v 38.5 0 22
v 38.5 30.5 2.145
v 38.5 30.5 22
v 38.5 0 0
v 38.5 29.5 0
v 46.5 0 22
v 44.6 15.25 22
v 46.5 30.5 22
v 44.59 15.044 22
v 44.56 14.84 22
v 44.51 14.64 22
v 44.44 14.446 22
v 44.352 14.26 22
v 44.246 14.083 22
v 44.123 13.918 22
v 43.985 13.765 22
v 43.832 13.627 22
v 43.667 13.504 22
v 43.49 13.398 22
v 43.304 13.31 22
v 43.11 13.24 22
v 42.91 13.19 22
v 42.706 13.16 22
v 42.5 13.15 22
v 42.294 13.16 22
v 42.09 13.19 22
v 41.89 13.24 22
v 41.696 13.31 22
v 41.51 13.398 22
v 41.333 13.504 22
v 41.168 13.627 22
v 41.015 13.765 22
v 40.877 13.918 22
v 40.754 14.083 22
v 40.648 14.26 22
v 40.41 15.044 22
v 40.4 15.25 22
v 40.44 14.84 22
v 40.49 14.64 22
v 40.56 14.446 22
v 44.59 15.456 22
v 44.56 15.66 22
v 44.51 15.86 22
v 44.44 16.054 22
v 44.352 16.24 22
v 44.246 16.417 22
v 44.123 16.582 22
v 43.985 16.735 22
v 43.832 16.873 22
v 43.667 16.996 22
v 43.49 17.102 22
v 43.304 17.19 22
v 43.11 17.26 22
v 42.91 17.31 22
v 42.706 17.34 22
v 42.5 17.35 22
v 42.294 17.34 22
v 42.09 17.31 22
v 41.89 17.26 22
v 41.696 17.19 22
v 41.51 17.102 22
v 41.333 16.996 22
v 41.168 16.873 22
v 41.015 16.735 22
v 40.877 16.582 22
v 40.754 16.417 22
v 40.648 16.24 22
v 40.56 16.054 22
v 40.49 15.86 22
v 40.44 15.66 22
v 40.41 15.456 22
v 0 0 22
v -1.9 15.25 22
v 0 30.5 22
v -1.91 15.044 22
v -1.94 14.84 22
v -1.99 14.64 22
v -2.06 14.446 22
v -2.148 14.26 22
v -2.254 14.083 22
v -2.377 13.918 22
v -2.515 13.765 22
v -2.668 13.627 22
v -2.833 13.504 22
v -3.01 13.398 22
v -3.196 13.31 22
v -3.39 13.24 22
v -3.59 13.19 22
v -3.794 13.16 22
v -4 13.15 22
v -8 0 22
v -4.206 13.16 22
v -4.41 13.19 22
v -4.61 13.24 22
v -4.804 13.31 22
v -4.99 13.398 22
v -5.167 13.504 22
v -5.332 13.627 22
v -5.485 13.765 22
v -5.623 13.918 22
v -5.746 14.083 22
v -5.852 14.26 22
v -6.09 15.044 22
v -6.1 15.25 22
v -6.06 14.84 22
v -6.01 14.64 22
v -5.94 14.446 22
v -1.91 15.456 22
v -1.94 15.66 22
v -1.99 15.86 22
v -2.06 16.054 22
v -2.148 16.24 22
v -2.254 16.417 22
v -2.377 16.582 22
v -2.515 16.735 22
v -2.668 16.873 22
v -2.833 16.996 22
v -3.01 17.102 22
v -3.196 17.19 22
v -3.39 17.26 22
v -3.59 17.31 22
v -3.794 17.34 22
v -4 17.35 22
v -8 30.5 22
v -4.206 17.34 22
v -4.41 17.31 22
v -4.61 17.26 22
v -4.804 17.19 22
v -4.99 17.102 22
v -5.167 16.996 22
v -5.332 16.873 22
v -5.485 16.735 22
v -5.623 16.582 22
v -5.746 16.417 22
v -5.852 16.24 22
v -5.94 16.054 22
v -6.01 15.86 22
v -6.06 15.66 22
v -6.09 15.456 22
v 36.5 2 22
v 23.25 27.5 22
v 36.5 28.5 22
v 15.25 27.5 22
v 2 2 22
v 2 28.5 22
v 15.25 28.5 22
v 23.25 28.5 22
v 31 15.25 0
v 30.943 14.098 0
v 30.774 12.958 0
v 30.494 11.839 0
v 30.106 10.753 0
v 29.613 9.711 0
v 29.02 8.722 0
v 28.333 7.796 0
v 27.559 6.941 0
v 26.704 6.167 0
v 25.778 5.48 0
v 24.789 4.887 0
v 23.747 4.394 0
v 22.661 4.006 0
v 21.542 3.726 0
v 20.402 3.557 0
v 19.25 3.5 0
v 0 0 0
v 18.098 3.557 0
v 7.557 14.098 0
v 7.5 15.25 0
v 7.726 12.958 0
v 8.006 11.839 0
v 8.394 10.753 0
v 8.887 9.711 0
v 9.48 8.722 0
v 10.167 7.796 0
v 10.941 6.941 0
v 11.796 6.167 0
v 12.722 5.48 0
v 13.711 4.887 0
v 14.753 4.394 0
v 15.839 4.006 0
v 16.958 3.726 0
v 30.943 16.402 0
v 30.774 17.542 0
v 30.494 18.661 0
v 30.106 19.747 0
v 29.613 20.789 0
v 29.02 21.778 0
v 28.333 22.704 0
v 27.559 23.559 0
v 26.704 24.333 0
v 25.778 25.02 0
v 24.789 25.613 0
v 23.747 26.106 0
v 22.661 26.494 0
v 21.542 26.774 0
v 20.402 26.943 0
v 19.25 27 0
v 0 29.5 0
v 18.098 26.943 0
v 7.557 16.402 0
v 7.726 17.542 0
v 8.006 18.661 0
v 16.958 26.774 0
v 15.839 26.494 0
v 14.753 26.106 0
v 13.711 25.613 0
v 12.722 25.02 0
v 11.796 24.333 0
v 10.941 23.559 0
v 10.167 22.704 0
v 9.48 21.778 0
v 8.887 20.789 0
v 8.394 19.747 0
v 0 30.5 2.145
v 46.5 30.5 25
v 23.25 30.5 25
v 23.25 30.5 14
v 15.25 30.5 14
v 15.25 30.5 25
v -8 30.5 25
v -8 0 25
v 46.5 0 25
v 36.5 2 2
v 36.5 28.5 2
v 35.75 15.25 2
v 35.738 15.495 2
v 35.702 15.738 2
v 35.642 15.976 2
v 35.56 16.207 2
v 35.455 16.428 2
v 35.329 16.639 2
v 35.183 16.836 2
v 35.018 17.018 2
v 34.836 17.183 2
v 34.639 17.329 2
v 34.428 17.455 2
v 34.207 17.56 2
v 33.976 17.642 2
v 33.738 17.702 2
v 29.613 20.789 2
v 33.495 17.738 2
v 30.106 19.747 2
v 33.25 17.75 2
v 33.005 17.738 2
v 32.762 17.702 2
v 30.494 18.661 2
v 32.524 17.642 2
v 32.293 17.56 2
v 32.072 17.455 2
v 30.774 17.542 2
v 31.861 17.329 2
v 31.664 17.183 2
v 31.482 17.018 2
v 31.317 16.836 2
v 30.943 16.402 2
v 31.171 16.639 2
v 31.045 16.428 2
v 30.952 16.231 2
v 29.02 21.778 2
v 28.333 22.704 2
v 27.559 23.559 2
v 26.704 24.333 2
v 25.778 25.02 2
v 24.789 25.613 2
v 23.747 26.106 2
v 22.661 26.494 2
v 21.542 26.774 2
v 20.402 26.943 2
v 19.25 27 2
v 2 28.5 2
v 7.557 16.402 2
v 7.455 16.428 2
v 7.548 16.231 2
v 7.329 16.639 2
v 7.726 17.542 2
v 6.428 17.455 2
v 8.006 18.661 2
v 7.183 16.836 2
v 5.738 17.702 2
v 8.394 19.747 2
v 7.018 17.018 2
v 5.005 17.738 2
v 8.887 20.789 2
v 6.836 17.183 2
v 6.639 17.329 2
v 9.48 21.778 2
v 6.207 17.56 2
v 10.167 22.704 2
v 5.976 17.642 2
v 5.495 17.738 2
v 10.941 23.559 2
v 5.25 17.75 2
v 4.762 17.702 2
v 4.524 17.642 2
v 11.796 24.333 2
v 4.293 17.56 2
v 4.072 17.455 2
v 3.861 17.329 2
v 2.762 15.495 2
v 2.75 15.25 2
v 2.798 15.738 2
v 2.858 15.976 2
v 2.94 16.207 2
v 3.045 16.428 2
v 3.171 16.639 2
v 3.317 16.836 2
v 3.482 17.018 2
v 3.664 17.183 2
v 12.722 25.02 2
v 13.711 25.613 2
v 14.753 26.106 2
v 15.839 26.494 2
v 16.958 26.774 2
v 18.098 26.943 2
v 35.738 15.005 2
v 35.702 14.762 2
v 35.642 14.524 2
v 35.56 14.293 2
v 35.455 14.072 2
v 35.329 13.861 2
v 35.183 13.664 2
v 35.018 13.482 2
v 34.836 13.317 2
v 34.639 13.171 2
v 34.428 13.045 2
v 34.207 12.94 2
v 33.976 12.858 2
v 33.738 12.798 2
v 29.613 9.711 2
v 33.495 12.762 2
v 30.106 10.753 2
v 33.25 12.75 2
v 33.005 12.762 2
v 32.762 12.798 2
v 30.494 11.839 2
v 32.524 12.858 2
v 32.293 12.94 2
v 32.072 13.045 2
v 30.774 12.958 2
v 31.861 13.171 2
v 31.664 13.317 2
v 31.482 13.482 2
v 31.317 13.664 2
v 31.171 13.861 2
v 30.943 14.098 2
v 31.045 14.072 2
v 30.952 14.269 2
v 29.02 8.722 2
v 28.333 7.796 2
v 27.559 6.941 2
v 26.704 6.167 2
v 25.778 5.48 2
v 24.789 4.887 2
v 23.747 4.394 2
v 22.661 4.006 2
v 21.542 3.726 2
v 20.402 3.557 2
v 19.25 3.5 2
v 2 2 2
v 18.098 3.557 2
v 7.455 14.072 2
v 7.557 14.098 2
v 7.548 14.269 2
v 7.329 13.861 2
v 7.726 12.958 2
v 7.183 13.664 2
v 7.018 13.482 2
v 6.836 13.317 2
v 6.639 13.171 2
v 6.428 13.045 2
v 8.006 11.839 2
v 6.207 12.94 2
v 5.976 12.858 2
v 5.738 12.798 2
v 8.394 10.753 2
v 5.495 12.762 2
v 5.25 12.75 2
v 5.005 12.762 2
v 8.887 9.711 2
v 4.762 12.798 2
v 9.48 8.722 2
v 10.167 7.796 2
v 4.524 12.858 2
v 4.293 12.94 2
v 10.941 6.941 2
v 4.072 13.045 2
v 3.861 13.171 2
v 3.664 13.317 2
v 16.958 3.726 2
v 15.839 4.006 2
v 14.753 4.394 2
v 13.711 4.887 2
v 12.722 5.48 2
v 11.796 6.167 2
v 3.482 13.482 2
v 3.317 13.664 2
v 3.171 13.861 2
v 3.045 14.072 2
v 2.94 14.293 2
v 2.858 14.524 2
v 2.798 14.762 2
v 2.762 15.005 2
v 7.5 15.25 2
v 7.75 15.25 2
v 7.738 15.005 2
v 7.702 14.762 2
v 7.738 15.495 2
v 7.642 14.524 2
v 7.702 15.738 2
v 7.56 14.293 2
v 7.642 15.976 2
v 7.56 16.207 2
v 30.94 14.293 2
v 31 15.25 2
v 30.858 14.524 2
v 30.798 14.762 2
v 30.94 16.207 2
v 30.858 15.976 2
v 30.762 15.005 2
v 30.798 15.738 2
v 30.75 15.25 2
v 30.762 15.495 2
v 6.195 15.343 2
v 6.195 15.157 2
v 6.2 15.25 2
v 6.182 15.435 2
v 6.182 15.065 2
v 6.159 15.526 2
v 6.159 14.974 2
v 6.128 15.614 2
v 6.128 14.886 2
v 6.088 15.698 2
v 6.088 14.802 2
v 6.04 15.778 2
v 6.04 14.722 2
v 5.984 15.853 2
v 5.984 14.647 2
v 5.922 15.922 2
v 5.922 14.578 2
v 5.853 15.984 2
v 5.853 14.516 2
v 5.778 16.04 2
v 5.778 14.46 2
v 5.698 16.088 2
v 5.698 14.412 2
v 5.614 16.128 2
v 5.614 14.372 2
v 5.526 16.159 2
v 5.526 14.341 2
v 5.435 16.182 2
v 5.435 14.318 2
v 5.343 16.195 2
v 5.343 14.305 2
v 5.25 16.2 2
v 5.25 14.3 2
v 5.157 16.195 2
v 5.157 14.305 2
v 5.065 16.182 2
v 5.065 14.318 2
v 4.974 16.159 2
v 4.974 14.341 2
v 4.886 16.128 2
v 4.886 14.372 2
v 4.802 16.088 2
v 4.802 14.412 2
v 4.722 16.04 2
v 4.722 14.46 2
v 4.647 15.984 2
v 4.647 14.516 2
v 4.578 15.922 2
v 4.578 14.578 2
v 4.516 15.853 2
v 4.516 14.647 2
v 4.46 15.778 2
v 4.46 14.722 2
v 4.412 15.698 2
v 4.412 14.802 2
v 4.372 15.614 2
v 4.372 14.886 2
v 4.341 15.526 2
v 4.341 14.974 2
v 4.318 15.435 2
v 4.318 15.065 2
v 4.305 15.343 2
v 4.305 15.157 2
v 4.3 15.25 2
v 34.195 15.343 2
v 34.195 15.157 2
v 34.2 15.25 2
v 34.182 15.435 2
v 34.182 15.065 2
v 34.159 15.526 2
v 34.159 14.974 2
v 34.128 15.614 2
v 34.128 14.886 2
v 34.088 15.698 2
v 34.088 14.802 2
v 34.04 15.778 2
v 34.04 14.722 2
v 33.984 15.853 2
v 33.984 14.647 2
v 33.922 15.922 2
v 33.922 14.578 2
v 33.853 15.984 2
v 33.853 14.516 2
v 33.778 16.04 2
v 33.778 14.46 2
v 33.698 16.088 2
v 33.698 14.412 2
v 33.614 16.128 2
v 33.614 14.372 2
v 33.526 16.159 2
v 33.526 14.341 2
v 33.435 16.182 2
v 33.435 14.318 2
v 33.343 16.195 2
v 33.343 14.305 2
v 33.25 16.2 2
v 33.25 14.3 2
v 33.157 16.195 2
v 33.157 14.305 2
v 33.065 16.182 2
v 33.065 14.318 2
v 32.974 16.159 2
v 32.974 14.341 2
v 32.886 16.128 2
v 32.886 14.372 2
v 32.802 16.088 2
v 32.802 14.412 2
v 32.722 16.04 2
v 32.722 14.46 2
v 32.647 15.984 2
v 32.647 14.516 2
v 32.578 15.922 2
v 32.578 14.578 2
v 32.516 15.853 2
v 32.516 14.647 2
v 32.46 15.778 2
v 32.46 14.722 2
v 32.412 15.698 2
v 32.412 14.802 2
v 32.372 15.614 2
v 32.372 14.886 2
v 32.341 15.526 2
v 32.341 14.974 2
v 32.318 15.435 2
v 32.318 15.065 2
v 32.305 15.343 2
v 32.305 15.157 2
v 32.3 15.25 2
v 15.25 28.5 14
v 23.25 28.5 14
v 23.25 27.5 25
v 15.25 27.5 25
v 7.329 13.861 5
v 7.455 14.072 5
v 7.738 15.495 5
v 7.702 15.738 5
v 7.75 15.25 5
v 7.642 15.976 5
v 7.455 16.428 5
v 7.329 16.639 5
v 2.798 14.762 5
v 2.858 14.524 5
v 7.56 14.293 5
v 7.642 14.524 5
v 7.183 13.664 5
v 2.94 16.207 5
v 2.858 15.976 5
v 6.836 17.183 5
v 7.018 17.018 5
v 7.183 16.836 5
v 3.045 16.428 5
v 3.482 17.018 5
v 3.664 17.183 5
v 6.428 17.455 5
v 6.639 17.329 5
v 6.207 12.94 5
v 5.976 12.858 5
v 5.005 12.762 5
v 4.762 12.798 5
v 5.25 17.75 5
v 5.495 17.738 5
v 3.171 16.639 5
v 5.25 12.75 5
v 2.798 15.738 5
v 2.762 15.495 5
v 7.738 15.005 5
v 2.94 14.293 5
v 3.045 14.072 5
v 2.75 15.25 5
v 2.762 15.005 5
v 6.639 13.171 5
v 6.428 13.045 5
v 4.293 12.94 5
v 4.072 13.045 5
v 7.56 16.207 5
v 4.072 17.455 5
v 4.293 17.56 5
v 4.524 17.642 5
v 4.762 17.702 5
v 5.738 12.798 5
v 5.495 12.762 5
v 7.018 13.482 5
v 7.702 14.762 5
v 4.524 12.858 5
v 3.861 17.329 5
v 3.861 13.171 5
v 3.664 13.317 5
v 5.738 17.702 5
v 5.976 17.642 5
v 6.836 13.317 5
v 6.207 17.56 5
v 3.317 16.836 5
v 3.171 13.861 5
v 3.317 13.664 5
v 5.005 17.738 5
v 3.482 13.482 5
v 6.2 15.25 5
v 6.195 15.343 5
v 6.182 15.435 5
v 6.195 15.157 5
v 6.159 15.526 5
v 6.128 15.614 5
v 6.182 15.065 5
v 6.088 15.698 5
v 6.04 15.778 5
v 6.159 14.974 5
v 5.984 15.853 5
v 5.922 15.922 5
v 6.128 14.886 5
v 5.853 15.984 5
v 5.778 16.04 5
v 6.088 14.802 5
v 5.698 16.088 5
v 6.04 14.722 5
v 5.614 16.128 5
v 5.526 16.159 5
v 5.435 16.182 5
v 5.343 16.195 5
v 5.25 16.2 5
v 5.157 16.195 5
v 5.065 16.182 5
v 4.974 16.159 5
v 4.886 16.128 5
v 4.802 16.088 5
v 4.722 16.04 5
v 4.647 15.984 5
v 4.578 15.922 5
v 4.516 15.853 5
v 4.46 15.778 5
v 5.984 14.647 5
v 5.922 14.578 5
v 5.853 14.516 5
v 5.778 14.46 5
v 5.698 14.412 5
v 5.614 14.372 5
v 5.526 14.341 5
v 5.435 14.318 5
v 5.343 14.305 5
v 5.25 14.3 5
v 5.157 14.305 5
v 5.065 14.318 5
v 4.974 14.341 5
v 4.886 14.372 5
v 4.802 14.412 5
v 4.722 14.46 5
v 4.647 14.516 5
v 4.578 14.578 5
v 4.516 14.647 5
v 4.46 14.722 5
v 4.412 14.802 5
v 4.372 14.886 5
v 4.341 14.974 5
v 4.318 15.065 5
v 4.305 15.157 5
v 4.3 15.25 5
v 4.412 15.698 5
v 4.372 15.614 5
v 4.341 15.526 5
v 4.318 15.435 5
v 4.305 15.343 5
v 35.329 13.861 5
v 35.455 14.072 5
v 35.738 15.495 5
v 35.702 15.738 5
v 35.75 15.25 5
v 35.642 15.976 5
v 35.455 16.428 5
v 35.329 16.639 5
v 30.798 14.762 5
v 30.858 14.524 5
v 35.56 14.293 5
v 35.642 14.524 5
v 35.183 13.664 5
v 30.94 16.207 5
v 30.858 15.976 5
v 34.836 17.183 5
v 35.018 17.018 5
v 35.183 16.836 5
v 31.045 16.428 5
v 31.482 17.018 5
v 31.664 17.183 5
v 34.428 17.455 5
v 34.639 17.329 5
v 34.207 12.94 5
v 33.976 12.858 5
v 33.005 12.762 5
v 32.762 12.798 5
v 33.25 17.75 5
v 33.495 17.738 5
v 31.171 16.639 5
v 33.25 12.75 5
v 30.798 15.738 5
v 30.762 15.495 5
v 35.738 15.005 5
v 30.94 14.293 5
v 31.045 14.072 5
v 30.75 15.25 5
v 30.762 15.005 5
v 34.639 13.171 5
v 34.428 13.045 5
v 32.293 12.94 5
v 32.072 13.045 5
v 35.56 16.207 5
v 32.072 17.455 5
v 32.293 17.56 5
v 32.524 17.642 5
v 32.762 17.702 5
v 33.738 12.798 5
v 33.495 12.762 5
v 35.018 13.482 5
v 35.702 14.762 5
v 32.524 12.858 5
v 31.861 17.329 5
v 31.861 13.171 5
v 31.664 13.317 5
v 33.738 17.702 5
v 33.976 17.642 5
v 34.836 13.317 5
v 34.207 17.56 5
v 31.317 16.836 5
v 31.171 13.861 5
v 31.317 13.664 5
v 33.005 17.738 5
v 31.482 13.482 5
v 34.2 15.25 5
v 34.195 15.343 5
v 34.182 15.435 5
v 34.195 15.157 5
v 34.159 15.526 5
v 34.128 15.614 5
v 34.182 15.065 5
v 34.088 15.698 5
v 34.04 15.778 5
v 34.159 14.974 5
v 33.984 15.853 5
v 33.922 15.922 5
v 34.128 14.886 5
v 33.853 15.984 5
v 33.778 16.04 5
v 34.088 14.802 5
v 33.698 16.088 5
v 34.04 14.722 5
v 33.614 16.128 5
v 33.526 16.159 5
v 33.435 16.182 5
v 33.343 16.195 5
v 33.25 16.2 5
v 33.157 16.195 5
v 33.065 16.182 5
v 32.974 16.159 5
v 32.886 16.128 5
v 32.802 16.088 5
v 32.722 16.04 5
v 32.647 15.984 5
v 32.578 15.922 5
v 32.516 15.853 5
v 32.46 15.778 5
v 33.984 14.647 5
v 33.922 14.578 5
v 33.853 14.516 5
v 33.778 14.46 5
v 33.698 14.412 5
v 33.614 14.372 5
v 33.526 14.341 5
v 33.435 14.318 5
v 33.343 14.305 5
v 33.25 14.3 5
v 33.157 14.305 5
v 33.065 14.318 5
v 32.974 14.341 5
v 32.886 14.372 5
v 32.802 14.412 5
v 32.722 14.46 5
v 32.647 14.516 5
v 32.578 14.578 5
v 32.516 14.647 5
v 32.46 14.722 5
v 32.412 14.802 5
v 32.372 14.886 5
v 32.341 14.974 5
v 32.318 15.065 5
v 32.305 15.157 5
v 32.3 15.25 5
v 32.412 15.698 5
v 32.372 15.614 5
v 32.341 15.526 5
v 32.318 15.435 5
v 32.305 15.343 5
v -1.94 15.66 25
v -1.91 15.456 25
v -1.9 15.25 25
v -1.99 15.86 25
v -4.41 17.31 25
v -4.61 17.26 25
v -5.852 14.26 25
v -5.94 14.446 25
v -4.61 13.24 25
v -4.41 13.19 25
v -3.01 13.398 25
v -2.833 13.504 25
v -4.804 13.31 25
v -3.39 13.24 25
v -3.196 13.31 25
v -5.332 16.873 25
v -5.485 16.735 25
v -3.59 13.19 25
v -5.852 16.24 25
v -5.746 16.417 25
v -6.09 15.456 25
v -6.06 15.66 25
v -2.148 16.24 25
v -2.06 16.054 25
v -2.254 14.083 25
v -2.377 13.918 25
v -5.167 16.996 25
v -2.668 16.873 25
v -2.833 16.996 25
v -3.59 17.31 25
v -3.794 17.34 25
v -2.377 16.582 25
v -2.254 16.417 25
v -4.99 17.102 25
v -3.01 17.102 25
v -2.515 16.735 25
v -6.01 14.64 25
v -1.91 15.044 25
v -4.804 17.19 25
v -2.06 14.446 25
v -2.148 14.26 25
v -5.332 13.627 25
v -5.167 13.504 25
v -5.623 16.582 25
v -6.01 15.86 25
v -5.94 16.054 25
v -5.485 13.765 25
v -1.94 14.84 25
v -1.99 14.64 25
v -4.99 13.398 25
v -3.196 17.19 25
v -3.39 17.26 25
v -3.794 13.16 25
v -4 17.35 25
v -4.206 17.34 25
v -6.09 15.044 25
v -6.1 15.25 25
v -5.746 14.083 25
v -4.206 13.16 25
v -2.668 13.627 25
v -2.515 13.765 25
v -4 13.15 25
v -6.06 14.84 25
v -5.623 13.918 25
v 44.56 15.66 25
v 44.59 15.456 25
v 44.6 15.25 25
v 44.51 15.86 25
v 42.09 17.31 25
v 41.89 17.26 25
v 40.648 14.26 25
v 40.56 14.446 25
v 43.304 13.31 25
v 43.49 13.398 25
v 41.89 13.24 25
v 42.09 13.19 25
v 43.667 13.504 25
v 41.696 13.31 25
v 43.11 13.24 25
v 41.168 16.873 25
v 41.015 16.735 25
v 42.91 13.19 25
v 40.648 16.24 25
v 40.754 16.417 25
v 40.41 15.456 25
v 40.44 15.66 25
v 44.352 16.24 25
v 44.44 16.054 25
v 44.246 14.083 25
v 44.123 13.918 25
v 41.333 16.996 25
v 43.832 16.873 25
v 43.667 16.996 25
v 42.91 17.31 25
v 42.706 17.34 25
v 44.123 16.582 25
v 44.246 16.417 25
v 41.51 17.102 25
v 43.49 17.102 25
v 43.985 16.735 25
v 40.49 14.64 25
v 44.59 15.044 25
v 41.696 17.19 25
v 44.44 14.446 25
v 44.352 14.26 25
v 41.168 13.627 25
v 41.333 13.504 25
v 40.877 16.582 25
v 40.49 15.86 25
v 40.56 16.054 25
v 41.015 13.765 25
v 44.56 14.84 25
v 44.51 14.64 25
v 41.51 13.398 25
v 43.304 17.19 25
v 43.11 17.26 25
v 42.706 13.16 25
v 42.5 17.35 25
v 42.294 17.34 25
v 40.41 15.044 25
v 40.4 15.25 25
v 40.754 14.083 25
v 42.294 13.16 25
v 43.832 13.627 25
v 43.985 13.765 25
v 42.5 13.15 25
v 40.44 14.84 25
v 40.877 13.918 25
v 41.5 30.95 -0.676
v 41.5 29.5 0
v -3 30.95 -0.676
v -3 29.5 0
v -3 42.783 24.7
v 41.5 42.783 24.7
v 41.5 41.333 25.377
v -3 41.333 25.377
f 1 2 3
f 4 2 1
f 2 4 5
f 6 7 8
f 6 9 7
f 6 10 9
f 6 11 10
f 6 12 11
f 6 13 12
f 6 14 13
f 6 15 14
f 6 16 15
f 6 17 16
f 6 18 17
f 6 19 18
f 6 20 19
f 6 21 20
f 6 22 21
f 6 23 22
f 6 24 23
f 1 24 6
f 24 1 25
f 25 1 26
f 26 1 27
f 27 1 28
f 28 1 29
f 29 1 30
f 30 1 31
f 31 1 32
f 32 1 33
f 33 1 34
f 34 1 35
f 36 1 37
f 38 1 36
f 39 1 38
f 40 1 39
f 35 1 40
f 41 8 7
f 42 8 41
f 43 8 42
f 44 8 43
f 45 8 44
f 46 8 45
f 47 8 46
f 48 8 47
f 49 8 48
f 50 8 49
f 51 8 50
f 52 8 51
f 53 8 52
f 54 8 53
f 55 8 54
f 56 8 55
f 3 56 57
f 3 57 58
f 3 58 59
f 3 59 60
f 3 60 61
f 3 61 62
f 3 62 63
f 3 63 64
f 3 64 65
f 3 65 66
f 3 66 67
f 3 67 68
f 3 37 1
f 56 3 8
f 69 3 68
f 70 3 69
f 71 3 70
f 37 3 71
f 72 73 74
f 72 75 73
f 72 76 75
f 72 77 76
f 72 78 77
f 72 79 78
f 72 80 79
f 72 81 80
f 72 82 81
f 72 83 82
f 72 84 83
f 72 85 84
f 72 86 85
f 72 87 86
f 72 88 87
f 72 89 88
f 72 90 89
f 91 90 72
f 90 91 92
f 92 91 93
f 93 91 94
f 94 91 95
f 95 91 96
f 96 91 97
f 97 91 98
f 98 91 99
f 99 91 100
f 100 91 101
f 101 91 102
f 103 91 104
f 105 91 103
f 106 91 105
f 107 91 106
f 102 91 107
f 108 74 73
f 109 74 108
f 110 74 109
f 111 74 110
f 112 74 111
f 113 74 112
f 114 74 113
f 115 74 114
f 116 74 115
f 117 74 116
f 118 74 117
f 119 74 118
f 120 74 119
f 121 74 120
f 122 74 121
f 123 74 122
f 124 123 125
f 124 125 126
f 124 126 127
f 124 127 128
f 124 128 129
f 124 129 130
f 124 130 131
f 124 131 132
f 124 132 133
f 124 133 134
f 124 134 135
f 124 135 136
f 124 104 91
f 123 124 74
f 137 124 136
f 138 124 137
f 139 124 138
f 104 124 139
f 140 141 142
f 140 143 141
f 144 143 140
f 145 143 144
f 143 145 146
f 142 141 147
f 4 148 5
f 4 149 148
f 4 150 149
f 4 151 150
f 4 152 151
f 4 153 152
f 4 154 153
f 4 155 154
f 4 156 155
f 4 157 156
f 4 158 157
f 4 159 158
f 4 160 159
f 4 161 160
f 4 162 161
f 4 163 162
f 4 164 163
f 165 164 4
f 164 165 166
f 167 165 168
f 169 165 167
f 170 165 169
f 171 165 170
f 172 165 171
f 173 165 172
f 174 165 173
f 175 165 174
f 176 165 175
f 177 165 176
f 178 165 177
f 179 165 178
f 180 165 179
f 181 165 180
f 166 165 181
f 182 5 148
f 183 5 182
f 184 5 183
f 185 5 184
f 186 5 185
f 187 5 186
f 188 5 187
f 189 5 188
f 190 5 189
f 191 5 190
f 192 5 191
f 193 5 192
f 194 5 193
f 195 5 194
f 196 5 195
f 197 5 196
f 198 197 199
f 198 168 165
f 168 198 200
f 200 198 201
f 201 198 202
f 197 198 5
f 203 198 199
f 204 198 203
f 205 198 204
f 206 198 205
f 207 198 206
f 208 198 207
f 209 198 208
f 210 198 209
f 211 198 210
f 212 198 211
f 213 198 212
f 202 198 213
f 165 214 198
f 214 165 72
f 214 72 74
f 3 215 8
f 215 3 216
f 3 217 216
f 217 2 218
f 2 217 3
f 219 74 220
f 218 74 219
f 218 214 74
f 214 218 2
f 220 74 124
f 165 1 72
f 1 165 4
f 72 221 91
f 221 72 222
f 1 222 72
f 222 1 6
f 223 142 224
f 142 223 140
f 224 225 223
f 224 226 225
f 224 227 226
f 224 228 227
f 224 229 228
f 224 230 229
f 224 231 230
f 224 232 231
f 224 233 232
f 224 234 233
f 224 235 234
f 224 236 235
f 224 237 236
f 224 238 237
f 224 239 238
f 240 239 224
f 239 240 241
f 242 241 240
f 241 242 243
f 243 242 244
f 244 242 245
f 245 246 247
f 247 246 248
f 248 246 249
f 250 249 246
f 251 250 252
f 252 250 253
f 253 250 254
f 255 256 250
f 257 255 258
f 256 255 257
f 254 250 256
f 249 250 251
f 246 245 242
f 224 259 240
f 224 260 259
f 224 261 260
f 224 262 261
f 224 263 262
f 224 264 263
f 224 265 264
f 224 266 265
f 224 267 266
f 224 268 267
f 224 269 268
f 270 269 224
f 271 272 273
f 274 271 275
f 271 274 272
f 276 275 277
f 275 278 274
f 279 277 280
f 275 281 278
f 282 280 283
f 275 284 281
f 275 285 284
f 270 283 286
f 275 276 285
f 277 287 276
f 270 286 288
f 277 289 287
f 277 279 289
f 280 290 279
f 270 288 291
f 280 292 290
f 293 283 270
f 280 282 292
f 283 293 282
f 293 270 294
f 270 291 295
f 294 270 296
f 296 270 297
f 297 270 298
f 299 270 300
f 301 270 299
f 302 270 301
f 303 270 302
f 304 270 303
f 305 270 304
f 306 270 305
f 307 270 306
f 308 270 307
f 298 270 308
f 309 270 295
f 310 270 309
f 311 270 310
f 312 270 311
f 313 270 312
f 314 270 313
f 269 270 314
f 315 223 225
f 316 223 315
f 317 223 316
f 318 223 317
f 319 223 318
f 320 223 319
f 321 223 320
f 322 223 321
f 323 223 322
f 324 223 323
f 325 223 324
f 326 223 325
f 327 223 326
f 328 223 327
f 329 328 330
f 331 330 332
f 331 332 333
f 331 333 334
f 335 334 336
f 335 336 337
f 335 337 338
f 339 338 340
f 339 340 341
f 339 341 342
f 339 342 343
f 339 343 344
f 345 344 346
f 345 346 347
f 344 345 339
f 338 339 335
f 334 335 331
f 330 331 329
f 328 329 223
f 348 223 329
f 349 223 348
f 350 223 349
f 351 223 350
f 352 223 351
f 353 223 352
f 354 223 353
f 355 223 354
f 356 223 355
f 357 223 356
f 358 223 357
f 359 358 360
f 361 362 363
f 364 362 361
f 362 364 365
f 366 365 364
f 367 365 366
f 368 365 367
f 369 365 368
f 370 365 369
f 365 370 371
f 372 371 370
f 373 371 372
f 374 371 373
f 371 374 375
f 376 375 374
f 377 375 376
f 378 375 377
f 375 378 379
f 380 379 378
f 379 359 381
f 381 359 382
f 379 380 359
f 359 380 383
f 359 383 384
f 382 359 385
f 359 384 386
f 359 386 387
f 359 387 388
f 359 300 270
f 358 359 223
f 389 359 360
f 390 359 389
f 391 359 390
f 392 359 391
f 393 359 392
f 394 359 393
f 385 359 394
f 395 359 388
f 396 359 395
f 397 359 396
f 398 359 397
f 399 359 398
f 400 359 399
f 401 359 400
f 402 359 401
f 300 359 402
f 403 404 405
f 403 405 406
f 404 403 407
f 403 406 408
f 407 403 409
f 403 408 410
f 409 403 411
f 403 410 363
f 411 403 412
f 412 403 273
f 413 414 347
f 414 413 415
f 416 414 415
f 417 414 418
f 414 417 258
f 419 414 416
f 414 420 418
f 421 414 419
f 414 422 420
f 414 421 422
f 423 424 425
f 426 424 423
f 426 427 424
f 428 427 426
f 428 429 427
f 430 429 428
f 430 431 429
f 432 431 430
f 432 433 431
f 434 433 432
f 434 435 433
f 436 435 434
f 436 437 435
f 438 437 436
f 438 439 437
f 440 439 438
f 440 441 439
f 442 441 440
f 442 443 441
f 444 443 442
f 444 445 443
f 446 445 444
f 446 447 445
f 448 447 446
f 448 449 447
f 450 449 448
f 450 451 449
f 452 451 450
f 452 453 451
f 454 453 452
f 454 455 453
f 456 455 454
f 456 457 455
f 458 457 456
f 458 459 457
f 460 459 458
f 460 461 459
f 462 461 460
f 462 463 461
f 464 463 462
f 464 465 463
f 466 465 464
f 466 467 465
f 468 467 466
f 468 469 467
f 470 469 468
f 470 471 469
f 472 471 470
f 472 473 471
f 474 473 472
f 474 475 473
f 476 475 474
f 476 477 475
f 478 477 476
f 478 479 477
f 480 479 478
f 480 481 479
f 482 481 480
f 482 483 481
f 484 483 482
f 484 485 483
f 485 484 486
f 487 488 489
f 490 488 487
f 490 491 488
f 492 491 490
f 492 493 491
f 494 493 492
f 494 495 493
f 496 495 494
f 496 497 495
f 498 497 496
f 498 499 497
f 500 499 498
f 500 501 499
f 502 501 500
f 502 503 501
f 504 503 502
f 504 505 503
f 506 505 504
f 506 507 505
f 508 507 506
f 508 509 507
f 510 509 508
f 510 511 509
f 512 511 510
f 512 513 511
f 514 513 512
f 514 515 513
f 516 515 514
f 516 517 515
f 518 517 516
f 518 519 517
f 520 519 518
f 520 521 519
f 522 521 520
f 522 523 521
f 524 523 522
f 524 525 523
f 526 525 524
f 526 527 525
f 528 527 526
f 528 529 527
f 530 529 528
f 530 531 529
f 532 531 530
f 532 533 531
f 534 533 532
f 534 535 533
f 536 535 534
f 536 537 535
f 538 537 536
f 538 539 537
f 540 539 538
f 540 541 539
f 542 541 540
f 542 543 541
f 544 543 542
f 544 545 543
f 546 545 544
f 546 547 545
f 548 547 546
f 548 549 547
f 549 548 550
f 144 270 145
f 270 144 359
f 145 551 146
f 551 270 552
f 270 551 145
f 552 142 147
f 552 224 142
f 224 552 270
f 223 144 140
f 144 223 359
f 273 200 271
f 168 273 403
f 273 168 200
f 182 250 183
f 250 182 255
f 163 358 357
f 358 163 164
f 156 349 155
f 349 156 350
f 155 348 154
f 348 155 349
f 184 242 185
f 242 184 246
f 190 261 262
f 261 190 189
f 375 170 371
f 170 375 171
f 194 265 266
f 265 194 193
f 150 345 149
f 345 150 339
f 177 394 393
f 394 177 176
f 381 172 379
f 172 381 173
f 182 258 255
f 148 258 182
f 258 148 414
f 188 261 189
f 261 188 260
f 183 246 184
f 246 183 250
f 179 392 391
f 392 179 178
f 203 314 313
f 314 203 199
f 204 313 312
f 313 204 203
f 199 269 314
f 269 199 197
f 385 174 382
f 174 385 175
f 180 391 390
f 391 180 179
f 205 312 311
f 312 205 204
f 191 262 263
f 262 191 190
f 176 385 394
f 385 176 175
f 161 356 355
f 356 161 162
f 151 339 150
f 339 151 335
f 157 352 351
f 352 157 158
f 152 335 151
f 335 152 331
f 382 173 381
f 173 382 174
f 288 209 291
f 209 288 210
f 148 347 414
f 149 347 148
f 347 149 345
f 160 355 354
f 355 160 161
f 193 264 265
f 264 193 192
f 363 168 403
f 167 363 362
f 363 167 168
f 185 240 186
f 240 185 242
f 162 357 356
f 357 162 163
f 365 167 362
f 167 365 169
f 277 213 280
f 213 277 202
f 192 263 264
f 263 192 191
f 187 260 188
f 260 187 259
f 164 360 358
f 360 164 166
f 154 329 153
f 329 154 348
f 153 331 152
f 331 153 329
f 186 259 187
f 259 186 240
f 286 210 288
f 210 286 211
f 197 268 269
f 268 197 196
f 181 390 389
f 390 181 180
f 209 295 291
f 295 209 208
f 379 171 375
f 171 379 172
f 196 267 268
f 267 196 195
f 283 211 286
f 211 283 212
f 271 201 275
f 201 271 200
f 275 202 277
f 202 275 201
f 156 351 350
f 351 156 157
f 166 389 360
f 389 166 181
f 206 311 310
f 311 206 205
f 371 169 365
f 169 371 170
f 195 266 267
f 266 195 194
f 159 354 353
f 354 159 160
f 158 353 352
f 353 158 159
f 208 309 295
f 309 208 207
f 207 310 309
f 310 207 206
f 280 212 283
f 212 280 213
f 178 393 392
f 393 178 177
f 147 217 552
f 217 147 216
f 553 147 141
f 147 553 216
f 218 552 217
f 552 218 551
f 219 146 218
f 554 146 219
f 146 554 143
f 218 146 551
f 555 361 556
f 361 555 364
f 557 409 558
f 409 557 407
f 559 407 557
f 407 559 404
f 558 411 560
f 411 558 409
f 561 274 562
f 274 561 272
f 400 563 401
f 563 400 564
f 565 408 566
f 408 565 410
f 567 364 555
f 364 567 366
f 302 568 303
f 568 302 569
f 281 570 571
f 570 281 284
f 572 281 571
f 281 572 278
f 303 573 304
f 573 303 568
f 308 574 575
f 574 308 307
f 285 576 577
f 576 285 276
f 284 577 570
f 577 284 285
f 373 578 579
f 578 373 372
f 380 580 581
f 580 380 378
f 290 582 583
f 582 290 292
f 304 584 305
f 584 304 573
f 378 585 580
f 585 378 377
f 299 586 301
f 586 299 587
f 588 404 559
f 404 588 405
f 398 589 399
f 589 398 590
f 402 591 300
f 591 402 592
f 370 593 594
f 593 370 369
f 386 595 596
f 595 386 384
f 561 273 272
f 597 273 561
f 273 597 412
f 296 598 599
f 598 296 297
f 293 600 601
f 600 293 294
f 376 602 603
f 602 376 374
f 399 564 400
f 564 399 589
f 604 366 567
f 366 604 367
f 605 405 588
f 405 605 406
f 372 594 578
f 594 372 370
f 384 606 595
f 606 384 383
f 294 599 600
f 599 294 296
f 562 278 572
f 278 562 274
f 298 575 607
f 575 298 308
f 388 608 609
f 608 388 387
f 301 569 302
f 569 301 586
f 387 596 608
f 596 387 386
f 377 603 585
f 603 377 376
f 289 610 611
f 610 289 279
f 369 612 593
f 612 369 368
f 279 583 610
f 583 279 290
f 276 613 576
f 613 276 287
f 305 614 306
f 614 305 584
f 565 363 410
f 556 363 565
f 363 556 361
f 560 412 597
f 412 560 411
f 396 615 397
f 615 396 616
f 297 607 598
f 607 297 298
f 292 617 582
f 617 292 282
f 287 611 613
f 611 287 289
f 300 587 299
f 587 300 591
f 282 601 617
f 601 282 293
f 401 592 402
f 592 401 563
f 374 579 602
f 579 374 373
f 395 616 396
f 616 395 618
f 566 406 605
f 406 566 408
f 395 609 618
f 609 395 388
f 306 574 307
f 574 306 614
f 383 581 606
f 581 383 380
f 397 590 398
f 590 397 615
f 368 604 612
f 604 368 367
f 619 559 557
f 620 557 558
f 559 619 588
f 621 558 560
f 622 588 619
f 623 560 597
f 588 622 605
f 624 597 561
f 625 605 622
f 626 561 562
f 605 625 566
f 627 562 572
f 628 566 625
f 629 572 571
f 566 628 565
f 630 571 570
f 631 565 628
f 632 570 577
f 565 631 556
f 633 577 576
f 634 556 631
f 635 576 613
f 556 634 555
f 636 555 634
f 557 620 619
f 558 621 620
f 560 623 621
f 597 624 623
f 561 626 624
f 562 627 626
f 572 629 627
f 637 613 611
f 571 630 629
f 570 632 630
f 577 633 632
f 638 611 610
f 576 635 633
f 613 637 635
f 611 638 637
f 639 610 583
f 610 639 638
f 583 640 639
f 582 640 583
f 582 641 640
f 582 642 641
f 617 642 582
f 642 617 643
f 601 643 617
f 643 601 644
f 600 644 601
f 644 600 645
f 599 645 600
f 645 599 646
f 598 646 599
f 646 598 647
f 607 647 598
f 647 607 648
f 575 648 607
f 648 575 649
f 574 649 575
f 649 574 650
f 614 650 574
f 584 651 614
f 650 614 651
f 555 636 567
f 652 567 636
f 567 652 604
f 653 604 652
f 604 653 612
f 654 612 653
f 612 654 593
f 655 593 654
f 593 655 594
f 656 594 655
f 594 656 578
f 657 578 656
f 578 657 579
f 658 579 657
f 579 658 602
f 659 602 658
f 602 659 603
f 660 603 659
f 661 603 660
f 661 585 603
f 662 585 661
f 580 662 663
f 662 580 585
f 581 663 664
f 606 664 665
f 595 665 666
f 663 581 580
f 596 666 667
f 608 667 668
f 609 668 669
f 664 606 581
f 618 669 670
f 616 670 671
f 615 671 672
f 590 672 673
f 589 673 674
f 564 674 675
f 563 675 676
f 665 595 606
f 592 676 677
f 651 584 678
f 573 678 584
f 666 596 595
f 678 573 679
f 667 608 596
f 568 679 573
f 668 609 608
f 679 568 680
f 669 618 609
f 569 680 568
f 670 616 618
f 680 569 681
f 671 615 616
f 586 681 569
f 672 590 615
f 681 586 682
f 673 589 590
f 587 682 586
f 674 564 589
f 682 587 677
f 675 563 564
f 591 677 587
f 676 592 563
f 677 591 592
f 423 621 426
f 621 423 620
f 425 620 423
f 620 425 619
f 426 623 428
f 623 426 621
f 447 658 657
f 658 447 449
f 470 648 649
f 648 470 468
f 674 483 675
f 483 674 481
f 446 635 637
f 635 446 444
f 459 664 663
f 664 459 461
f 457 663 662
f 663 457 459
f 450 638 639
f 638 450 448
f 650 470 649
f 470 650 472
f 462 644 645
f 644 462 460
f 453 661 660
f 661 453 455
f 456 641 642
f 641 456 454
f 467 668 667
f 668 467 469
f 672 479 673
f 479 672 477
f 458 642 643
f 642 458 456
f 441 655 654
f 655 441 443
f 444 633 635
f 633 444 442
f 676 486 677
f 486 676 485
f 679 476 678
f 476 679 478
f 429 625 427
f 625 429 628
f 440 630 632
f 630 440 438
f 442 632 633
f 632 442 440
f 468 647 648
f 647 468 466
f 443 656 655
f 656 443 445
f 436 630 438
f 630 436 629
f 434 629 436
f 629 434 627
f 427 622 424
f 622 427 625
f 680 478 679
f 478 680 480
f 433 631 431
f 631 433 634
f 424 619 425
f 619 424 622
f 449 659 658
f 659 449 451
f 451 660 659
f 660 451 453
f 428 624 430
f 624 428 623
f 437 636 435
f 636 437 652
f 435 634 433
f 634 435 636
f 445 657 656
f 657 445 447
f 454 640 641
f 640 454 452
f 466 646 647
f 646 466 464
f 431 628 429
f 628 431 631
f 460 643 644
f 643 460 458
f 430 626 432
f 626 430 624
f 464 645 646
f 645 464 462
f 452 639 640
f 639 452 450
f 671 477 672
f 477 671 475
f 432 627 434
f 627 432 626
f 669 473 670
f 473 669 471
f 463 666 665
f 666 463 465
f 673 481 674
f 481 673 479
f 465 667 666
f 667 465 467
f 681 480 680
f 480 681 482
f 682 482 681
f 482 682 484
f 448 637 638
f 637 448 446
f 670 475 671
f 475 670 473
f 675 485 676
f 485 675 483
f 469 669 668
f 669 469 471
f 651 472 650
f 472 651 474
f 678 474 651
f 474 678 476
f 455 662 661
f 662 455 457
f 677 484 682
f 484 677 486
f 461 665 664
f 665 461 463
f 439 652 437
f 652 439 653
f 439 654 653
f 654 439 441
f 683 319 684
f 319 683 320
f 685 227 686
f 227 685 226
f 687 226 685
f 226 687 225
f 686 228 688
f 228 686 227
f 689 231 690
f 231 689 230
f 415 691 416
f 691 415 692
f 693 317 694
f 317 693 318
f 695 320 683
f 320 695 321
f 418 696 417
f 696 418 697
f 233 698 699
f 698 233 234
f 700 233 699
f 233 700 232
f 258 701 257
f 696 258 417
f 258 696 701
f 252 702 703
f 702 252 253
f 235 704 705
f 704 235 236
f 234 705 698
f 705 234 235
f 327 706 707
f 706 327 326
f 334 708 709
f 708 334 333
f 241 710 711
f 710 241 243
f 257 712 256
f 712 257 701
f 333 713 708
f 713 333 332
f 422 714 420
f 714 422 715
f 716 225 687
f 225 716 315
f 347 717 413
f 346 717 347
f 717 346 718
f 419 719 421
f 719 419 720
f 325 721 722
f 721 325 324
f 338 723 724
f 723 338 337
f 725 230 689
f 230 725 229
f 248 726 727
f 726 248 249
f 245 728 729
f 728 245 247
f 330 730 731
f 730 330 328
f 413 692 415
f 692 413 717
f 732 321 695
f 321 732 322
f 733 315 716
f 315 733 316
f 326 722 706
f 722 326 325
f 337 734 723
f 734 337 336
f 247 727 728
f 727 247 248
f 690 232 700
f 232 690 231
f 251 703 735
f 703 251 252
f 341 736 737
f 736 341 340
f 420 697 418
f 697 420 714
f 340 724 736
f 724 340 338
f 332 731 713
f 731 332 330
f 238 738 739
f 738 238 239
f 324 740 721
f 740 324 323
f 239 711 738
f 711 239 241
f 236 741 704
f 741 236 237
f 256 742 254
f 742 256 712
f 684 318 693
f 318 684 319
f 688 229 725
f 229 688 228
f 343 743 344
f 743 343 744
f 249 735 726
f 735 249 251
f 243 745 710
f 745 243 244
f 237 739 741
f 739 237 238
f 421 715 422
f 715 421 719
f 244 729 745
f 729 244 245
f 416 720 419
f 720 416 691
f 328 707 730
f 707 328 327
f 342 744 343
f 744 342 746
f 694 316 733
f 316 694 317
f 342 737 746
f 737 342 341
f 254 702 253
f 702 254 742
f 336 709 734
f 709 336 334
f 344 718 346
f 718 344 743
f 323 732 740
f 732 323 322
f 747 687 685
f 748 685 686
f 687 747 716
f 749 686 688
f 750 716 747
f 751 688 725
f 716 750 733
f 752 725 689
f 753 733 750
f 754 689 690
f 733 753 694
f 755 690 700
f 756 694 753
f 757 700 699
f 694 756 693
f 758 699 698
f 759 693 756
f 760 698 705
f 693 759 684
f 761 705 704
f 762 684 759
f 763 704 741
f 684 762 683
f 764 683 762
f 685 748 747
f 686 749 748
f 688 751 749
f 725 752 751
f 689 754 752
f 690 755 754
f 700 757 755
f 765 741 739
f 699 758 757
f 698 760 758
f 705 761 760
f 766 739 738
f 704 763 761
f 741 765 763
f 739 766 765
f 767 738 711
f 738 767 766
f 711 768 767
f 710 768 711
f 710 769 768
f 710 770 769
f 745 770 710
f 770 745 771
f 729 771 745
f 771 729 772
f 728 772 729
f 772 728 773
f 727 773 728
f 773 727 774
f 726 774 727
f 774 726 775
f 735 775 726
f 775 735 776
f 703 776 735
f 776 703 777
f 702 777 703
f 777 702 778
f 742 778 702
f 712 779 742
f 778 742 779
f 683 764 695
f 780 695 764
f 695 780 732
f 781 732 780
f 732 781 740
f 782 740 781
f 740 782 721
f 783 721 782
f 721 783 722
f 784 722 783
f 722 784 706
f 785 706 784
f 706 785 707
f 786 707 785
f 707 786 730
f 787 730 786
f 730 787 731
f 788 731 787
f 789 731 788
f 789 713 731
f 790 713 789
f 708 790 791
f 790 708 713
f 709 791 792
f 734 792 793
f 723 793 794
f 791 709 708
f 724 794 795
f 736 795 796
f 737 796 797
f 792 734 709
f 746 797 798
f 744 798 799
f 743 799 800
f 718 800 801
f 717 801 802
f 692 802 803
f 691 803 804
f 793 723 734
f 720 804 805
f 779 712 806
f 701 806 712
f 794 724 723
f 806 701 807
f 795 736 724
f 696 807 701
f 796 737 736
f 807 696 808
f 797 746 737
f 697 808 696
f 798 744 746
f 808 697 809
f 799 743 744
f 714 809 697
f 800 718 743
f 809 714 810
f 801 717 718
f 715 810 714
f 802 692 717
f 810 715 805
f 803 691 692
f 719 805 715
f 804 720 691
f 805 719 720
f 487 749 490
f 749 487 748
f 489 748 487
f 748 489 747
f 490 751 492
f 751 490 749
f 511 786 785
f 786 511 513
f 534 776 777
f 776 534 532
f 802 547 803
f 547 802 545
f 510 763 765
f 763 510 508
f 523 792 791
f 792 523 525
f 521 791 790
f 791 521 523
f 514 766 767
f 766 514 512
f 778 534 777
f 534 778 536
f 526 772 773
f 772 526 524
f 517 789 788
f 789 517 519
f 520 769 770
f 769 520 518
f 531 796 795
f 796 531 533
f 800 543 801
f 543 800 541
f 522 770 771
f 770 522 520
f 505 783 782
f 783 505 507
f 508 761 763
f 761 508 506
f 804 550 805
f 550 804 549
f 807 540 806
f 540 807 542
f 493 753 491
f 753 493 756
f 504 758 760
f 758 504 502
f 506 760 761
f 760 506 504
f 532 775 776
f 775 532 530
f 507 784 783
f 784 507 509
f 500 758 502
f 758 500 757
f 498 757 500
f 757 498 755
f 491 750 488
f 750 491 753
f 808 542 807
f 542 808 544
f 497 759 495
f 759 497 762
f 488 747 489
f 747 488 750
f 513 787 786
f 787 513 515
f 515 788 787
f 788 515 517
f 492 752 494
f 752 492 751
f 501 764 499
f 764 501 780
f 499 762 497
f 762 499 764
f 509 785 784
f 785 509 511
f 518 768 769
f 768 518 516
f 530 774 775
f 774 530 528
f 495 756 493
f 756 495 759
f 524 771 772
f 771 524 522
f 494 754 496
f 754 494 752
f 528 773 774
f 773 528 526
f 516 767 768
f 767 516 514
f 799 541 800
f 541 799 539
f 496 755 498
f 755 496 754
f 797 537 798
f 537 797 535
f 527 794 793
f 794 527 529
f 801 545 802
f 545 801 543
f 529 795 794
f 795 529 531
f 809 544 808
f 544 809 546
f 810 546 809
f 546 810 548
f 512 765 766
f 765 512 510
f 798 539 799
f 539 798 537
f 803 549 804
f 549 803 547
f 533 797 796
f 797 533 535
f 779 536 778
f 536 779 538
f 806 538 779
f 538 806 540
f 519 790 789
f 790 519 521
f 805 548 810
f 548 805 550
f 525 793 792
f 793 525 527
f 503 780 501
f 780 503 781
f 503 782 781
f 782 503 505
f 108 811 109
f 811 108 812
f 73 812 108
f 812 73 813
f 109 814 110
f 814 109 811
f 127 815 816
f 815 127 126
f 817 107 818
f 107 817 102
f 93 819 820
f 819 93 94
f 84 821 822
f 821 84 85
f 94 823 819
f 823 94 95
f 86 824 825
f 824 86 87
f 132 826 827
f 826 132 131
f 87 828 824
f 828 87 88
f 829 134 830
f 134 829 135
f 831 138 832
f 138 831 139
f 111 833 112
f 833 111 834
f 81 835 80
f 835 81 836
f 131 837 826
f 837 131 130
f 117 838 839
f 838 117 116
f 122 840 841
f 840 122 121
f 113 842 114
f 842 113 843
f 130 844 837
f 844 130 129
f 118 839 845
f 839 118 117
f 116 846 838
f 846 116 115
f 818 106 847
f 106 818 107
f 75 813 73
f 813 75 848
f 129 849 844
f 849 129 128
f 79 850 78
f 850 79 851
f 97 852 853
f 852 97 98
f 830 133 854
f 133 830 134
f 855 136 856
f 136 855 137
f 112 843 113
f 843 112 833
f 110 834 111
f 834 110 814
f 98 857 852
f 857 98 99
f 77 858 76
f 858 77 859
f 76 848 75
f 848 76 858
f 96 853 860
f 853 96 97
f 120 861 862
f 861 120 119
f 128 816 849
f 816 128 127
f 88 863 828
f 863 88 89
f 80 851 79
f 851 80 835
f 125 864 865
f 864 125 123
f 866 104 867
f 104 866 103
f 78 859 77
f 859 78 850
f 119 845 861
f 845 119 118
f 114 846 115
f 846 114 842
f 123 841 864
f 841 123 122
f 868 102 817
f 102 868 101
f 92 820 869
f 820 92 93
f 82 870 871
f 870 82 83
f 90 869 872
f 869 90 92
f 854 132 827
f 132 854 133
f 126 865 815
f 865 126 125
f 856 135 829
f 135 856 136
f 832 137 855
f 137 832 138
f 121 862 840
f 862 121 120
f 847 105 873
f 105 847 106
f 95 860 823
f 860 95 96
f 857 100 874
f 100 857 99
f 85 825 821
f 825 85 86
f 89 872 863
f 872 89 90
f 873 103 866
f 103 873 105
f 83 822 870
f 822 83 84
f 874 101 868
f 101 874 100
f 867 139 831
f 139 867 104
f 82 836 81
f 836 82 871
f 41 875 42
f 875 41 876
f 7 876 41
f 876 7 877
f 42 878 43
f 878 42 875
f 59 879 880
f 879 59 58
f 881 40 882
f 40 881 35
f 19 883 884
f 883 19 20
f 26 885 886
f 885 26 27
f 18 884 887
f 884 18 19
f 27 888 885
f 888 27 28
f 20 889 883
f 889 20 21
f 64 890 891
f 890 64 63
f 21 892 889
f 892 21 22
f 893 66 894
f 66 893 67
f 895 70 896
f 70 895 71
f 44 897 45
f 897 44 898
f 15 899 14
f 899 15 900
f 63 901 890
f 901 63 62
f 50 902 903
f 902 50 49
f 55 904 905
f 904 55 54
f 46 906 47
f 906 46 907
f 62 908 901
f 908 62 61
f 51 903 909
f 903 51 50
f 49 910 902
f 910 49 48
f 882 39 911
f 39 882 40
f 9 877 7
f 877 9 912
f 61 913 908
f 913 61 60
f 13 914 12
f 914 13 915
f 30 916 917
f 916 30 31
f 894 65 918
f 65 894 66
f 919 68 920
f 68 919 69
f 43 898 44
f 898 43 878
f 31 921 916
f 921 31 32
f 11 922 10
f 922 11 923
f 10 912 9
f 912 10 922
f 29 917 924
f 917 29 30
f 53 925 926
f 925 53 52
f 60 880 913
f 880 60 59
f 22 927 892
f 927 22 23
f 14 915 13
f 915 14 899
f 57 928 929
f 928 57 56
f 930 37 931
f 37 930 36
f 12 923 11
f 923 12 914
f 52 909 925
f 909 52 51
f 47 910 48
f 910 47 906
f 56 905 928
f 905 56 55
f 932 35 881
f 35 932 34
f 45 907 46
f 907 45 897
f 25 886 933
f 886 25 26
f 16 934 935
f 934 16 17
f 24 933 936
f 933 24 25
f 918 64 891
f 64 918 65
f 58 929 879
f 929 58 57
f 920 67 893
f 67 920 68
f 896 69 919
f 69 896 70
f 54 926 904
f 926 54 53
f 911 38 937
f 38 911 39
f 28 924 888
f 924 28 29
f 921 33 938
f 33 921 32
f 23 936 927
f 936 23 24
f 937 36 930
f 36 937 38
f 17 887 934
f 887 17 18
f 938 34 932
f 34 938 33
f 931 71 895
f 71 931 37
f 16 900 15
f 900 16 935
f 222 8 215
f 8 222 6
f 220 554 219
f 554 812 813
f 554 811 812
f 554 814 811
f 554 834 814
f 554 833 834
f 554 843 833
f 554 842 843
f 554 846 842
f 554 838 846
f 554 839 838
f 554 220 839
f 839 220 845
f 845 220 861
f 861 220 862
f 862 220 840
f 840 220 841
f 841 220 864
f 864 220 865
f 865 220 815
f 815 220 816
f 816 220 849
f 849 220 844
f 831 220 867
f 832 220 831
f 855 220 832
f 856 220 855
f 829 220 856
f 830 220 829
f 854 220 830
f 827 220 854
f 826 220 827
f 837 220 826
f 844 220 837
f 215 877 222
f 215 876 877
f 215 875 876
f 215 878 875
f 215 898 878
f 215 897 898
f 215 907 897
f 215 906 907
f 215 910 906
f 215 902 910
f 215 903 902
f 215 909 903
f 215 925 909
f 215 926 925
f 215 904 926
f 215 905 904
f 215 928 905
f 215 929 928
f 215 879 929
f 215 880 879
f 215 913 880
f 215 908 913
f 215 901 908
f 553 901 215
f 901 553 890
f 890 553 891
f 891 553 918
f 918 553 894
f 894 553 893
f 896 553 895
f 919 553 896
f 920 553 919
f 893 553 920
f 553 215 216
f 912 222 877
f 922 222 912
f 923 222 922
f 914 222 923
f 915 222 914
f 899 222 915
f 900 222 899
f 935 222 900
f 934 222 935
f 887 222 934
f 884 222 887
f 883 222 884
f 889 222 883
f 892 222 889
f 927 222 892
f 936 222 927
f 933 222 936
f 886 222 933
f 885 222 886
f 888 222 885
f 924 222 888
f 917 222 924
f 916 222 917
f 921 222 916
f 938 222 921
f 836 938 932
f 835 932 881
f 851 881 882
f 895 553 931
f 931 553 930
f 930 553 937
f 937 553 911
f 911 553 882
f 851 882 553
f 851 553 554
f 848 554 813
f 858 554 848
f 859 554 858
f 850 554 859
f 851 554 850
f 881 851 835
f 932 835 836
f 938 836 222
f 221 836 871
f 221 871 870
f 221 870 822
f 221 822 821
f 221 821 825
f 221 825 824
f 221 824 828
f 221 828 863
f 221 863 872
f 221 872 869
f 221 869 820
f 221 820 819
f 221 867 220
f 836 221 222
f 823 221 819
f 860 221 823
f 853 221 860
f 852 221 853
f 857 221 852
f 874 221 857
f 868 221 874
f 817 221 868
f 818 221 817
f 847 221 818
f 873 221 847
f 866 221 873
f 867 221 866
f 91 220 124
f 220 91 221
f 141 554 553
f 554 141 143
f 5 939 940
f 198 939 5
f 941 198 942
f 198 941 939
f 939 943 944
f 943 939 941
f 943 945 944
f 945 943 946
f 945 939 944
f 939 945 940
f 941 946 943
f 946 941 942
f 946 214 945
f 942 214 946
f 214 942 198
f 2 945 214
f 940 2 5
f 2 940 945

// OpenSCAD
// HC-SR501 PIR sensor housing: holds the 32 x 24 mm board with its 23 mm Fresnel dome
// poking through, and a sloped roof to shed dust and droppings. Mounts on the coop wall
// or ceiling, angled 30 deg down across the roost area.
// Print: PETG, 3 perimeters, 20% infill, back-plate down, no supports.

$fn = 64;
pcb = [32.5, 24.5];
pcb_hole_d = 2.2;       // HC-SR501 mounting holes (28 mm apart on the long axis)
pcb_hole_dx = 28;
dome_d = 23.5;
depth = 22;             // room for the pots, jumper and pins behind the board
wall = 2;
tilt = 30;

outer = [pcb[0] + 2 * wall + 2, pcb[1] + 2 * wall + 2];

module shell() {
    difference() {
        cube([outer[0], outer[1], depth]);
        translate([wall, wall, wall]) cube([outer[0] - 2 * wall, outer[1] - 2 * wall, depth]);
        // dome opening in the front face (the +z face is left open, board sits on ledges)
        translate([outer[0] / 2, outer[1] / 2, -1]) cylinder(d = dome_d, h = wall + 2);
        // wire slot
        translate([outer[0] / 2 - 4, outer[1] - wall - 1, depth - 8]) cube([8, wall + 2, 9]);
    }
    // PCB standoffs
    for (dx = [-pcb_hole_dx / 2, pcb_hole_dx / 2])
        translate([outer[0] / 2 + dx, outer[1] / 2, wall])
            difference() {
                cylinder(d = 5, h = 3);
                cylinder(d = pcb_hole_d - 0.3, h = 4);
            }
}

module wall_wedge() {
    // wedge between the housing back and the wall sets the downward tilt
    hull() {
        cube([outer[0], 0.01, depth]);
        translate([0, 0, 0]) cube([outer[0], outer[1] * sin(tilt), 0.01]);
    }
}

module back_plate() {
    difference() {
        translate([-8, 0, depth]) cube([outer[0] + 16, outer[1], 3]);
        for (x = [-4, outer[0] + 4]) translate([x, outer[1] / 2, depth - 1]) cylinder(d = 4.2, h = 6);
        translate([outer[0] / 2 - 4, outer[1] - wall - 1, depth - 1]) cube([8, wall + 2, 6]);
    }
}

// Housing + integral back plate with screw ears (print as one piece)
shell();
back_plate();
// drip roof
translate([-3, outer[1] - 1, 0]) rotate([-25, 0, 0]) cube([outer[0] + 6, 1.6, depth + 6]);
